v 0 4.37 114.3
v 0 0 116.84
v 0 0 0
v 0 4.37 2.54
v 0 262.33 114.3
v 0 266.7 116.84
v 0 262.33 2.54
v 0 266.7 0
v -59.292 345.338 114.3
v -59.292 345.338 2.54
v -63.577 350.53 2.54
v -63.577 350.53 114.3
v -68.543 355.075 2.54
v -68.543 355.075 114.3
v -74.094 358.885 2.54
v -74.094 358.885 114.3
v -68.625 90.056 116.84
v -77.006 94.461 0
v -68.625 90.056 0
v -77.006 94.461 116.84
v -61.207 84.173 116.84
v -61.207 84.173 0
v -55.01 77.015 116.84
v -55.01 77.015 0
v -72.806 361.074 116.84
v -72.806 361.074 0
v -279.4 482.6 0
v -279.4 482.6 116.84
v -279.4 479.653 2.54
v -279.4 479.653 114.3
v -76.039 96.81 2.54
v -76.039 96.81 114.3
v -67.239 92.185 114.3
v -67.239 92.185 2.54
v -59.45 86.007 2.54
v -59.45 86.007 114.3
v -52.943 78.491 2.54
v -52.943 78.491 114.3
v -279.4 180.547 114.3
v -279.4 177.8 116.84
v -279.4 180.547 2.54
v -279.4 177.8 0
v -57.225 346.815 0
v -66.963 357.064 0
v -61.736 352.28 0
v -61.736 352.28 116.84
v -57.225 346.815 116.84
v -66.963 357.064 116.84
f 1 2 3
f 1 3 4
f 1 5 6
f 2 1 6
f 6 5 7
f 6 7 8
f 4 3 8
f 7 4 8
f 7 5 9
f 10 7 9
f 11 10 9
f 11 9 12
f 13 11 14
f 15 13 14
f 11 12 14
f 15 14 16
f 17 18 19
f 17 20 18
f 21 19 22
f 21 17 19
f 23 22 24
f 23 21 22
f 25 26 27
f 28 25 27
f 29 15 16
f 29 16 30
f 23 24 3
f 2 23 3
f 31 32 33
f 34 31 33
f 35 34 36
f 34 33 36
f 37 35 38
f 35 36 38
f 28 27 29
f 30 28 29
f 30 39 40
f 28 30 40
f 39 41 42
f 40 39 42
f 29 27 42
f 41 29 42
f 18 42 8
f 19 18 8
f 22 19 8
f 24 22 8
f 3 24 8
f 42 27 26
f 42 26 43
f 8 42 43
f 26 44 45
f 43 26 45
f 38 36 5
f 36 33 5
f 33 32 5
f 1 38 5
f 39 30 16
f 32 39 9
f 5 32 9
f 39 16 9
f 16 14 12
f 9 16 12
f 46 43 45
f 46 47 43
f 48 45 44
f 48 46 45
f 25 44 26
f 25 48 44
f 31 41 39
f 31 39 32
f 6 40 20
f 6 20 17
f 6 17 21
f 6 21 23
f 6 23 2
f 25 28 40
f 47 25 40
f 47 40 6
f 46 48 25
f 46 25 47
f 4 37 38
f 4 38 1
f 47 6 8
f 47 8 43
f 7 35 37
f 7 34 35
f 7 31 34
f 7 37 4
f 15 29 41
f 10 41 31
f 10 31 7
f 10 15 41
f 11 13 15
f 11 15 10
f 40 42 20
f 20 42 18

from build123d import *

# Parameters (mm, degrees)
BOSS_EXTRUDE1_DEPTH = 116.84
FILLET1_R           = 50.8
SHELL2_T            = -2.54


with BuildPart() as part:
    # Sketch1 → Boss-Extrude1 (new body)
    with BuildSketch(Plane.XY):
        Polygon((0, 0), (0, 266.7), (-63.5, 355.6), (-279.4, 482.6), (-279.4, 177.8), (-63.5, 88.9), align=None)
    extrude(amount=BOSS_EXTRUDE1_DEPTH)

    # Fillet1
    fillet1_edges = [part.edges().sort_by_distance(p)[0] for p in [
        (-63.5, 88.9, 58.42),
        (-63.5, 355.6, 58.42),
    ]]
    fillet(fillet1_edges, radius=FILLET1_R)

    # Shell2
    shell2_openings = [part.faces().sort_by_distance(p)[0] for p in [
        (-279.4, 330.2, 58.42),
        (0, 133.35, 58.42),
    ]]
    offset(amount=SHELL2_T, openings=shell2_openings, kind=Kind.INTERSECTION)


solid = part.part
